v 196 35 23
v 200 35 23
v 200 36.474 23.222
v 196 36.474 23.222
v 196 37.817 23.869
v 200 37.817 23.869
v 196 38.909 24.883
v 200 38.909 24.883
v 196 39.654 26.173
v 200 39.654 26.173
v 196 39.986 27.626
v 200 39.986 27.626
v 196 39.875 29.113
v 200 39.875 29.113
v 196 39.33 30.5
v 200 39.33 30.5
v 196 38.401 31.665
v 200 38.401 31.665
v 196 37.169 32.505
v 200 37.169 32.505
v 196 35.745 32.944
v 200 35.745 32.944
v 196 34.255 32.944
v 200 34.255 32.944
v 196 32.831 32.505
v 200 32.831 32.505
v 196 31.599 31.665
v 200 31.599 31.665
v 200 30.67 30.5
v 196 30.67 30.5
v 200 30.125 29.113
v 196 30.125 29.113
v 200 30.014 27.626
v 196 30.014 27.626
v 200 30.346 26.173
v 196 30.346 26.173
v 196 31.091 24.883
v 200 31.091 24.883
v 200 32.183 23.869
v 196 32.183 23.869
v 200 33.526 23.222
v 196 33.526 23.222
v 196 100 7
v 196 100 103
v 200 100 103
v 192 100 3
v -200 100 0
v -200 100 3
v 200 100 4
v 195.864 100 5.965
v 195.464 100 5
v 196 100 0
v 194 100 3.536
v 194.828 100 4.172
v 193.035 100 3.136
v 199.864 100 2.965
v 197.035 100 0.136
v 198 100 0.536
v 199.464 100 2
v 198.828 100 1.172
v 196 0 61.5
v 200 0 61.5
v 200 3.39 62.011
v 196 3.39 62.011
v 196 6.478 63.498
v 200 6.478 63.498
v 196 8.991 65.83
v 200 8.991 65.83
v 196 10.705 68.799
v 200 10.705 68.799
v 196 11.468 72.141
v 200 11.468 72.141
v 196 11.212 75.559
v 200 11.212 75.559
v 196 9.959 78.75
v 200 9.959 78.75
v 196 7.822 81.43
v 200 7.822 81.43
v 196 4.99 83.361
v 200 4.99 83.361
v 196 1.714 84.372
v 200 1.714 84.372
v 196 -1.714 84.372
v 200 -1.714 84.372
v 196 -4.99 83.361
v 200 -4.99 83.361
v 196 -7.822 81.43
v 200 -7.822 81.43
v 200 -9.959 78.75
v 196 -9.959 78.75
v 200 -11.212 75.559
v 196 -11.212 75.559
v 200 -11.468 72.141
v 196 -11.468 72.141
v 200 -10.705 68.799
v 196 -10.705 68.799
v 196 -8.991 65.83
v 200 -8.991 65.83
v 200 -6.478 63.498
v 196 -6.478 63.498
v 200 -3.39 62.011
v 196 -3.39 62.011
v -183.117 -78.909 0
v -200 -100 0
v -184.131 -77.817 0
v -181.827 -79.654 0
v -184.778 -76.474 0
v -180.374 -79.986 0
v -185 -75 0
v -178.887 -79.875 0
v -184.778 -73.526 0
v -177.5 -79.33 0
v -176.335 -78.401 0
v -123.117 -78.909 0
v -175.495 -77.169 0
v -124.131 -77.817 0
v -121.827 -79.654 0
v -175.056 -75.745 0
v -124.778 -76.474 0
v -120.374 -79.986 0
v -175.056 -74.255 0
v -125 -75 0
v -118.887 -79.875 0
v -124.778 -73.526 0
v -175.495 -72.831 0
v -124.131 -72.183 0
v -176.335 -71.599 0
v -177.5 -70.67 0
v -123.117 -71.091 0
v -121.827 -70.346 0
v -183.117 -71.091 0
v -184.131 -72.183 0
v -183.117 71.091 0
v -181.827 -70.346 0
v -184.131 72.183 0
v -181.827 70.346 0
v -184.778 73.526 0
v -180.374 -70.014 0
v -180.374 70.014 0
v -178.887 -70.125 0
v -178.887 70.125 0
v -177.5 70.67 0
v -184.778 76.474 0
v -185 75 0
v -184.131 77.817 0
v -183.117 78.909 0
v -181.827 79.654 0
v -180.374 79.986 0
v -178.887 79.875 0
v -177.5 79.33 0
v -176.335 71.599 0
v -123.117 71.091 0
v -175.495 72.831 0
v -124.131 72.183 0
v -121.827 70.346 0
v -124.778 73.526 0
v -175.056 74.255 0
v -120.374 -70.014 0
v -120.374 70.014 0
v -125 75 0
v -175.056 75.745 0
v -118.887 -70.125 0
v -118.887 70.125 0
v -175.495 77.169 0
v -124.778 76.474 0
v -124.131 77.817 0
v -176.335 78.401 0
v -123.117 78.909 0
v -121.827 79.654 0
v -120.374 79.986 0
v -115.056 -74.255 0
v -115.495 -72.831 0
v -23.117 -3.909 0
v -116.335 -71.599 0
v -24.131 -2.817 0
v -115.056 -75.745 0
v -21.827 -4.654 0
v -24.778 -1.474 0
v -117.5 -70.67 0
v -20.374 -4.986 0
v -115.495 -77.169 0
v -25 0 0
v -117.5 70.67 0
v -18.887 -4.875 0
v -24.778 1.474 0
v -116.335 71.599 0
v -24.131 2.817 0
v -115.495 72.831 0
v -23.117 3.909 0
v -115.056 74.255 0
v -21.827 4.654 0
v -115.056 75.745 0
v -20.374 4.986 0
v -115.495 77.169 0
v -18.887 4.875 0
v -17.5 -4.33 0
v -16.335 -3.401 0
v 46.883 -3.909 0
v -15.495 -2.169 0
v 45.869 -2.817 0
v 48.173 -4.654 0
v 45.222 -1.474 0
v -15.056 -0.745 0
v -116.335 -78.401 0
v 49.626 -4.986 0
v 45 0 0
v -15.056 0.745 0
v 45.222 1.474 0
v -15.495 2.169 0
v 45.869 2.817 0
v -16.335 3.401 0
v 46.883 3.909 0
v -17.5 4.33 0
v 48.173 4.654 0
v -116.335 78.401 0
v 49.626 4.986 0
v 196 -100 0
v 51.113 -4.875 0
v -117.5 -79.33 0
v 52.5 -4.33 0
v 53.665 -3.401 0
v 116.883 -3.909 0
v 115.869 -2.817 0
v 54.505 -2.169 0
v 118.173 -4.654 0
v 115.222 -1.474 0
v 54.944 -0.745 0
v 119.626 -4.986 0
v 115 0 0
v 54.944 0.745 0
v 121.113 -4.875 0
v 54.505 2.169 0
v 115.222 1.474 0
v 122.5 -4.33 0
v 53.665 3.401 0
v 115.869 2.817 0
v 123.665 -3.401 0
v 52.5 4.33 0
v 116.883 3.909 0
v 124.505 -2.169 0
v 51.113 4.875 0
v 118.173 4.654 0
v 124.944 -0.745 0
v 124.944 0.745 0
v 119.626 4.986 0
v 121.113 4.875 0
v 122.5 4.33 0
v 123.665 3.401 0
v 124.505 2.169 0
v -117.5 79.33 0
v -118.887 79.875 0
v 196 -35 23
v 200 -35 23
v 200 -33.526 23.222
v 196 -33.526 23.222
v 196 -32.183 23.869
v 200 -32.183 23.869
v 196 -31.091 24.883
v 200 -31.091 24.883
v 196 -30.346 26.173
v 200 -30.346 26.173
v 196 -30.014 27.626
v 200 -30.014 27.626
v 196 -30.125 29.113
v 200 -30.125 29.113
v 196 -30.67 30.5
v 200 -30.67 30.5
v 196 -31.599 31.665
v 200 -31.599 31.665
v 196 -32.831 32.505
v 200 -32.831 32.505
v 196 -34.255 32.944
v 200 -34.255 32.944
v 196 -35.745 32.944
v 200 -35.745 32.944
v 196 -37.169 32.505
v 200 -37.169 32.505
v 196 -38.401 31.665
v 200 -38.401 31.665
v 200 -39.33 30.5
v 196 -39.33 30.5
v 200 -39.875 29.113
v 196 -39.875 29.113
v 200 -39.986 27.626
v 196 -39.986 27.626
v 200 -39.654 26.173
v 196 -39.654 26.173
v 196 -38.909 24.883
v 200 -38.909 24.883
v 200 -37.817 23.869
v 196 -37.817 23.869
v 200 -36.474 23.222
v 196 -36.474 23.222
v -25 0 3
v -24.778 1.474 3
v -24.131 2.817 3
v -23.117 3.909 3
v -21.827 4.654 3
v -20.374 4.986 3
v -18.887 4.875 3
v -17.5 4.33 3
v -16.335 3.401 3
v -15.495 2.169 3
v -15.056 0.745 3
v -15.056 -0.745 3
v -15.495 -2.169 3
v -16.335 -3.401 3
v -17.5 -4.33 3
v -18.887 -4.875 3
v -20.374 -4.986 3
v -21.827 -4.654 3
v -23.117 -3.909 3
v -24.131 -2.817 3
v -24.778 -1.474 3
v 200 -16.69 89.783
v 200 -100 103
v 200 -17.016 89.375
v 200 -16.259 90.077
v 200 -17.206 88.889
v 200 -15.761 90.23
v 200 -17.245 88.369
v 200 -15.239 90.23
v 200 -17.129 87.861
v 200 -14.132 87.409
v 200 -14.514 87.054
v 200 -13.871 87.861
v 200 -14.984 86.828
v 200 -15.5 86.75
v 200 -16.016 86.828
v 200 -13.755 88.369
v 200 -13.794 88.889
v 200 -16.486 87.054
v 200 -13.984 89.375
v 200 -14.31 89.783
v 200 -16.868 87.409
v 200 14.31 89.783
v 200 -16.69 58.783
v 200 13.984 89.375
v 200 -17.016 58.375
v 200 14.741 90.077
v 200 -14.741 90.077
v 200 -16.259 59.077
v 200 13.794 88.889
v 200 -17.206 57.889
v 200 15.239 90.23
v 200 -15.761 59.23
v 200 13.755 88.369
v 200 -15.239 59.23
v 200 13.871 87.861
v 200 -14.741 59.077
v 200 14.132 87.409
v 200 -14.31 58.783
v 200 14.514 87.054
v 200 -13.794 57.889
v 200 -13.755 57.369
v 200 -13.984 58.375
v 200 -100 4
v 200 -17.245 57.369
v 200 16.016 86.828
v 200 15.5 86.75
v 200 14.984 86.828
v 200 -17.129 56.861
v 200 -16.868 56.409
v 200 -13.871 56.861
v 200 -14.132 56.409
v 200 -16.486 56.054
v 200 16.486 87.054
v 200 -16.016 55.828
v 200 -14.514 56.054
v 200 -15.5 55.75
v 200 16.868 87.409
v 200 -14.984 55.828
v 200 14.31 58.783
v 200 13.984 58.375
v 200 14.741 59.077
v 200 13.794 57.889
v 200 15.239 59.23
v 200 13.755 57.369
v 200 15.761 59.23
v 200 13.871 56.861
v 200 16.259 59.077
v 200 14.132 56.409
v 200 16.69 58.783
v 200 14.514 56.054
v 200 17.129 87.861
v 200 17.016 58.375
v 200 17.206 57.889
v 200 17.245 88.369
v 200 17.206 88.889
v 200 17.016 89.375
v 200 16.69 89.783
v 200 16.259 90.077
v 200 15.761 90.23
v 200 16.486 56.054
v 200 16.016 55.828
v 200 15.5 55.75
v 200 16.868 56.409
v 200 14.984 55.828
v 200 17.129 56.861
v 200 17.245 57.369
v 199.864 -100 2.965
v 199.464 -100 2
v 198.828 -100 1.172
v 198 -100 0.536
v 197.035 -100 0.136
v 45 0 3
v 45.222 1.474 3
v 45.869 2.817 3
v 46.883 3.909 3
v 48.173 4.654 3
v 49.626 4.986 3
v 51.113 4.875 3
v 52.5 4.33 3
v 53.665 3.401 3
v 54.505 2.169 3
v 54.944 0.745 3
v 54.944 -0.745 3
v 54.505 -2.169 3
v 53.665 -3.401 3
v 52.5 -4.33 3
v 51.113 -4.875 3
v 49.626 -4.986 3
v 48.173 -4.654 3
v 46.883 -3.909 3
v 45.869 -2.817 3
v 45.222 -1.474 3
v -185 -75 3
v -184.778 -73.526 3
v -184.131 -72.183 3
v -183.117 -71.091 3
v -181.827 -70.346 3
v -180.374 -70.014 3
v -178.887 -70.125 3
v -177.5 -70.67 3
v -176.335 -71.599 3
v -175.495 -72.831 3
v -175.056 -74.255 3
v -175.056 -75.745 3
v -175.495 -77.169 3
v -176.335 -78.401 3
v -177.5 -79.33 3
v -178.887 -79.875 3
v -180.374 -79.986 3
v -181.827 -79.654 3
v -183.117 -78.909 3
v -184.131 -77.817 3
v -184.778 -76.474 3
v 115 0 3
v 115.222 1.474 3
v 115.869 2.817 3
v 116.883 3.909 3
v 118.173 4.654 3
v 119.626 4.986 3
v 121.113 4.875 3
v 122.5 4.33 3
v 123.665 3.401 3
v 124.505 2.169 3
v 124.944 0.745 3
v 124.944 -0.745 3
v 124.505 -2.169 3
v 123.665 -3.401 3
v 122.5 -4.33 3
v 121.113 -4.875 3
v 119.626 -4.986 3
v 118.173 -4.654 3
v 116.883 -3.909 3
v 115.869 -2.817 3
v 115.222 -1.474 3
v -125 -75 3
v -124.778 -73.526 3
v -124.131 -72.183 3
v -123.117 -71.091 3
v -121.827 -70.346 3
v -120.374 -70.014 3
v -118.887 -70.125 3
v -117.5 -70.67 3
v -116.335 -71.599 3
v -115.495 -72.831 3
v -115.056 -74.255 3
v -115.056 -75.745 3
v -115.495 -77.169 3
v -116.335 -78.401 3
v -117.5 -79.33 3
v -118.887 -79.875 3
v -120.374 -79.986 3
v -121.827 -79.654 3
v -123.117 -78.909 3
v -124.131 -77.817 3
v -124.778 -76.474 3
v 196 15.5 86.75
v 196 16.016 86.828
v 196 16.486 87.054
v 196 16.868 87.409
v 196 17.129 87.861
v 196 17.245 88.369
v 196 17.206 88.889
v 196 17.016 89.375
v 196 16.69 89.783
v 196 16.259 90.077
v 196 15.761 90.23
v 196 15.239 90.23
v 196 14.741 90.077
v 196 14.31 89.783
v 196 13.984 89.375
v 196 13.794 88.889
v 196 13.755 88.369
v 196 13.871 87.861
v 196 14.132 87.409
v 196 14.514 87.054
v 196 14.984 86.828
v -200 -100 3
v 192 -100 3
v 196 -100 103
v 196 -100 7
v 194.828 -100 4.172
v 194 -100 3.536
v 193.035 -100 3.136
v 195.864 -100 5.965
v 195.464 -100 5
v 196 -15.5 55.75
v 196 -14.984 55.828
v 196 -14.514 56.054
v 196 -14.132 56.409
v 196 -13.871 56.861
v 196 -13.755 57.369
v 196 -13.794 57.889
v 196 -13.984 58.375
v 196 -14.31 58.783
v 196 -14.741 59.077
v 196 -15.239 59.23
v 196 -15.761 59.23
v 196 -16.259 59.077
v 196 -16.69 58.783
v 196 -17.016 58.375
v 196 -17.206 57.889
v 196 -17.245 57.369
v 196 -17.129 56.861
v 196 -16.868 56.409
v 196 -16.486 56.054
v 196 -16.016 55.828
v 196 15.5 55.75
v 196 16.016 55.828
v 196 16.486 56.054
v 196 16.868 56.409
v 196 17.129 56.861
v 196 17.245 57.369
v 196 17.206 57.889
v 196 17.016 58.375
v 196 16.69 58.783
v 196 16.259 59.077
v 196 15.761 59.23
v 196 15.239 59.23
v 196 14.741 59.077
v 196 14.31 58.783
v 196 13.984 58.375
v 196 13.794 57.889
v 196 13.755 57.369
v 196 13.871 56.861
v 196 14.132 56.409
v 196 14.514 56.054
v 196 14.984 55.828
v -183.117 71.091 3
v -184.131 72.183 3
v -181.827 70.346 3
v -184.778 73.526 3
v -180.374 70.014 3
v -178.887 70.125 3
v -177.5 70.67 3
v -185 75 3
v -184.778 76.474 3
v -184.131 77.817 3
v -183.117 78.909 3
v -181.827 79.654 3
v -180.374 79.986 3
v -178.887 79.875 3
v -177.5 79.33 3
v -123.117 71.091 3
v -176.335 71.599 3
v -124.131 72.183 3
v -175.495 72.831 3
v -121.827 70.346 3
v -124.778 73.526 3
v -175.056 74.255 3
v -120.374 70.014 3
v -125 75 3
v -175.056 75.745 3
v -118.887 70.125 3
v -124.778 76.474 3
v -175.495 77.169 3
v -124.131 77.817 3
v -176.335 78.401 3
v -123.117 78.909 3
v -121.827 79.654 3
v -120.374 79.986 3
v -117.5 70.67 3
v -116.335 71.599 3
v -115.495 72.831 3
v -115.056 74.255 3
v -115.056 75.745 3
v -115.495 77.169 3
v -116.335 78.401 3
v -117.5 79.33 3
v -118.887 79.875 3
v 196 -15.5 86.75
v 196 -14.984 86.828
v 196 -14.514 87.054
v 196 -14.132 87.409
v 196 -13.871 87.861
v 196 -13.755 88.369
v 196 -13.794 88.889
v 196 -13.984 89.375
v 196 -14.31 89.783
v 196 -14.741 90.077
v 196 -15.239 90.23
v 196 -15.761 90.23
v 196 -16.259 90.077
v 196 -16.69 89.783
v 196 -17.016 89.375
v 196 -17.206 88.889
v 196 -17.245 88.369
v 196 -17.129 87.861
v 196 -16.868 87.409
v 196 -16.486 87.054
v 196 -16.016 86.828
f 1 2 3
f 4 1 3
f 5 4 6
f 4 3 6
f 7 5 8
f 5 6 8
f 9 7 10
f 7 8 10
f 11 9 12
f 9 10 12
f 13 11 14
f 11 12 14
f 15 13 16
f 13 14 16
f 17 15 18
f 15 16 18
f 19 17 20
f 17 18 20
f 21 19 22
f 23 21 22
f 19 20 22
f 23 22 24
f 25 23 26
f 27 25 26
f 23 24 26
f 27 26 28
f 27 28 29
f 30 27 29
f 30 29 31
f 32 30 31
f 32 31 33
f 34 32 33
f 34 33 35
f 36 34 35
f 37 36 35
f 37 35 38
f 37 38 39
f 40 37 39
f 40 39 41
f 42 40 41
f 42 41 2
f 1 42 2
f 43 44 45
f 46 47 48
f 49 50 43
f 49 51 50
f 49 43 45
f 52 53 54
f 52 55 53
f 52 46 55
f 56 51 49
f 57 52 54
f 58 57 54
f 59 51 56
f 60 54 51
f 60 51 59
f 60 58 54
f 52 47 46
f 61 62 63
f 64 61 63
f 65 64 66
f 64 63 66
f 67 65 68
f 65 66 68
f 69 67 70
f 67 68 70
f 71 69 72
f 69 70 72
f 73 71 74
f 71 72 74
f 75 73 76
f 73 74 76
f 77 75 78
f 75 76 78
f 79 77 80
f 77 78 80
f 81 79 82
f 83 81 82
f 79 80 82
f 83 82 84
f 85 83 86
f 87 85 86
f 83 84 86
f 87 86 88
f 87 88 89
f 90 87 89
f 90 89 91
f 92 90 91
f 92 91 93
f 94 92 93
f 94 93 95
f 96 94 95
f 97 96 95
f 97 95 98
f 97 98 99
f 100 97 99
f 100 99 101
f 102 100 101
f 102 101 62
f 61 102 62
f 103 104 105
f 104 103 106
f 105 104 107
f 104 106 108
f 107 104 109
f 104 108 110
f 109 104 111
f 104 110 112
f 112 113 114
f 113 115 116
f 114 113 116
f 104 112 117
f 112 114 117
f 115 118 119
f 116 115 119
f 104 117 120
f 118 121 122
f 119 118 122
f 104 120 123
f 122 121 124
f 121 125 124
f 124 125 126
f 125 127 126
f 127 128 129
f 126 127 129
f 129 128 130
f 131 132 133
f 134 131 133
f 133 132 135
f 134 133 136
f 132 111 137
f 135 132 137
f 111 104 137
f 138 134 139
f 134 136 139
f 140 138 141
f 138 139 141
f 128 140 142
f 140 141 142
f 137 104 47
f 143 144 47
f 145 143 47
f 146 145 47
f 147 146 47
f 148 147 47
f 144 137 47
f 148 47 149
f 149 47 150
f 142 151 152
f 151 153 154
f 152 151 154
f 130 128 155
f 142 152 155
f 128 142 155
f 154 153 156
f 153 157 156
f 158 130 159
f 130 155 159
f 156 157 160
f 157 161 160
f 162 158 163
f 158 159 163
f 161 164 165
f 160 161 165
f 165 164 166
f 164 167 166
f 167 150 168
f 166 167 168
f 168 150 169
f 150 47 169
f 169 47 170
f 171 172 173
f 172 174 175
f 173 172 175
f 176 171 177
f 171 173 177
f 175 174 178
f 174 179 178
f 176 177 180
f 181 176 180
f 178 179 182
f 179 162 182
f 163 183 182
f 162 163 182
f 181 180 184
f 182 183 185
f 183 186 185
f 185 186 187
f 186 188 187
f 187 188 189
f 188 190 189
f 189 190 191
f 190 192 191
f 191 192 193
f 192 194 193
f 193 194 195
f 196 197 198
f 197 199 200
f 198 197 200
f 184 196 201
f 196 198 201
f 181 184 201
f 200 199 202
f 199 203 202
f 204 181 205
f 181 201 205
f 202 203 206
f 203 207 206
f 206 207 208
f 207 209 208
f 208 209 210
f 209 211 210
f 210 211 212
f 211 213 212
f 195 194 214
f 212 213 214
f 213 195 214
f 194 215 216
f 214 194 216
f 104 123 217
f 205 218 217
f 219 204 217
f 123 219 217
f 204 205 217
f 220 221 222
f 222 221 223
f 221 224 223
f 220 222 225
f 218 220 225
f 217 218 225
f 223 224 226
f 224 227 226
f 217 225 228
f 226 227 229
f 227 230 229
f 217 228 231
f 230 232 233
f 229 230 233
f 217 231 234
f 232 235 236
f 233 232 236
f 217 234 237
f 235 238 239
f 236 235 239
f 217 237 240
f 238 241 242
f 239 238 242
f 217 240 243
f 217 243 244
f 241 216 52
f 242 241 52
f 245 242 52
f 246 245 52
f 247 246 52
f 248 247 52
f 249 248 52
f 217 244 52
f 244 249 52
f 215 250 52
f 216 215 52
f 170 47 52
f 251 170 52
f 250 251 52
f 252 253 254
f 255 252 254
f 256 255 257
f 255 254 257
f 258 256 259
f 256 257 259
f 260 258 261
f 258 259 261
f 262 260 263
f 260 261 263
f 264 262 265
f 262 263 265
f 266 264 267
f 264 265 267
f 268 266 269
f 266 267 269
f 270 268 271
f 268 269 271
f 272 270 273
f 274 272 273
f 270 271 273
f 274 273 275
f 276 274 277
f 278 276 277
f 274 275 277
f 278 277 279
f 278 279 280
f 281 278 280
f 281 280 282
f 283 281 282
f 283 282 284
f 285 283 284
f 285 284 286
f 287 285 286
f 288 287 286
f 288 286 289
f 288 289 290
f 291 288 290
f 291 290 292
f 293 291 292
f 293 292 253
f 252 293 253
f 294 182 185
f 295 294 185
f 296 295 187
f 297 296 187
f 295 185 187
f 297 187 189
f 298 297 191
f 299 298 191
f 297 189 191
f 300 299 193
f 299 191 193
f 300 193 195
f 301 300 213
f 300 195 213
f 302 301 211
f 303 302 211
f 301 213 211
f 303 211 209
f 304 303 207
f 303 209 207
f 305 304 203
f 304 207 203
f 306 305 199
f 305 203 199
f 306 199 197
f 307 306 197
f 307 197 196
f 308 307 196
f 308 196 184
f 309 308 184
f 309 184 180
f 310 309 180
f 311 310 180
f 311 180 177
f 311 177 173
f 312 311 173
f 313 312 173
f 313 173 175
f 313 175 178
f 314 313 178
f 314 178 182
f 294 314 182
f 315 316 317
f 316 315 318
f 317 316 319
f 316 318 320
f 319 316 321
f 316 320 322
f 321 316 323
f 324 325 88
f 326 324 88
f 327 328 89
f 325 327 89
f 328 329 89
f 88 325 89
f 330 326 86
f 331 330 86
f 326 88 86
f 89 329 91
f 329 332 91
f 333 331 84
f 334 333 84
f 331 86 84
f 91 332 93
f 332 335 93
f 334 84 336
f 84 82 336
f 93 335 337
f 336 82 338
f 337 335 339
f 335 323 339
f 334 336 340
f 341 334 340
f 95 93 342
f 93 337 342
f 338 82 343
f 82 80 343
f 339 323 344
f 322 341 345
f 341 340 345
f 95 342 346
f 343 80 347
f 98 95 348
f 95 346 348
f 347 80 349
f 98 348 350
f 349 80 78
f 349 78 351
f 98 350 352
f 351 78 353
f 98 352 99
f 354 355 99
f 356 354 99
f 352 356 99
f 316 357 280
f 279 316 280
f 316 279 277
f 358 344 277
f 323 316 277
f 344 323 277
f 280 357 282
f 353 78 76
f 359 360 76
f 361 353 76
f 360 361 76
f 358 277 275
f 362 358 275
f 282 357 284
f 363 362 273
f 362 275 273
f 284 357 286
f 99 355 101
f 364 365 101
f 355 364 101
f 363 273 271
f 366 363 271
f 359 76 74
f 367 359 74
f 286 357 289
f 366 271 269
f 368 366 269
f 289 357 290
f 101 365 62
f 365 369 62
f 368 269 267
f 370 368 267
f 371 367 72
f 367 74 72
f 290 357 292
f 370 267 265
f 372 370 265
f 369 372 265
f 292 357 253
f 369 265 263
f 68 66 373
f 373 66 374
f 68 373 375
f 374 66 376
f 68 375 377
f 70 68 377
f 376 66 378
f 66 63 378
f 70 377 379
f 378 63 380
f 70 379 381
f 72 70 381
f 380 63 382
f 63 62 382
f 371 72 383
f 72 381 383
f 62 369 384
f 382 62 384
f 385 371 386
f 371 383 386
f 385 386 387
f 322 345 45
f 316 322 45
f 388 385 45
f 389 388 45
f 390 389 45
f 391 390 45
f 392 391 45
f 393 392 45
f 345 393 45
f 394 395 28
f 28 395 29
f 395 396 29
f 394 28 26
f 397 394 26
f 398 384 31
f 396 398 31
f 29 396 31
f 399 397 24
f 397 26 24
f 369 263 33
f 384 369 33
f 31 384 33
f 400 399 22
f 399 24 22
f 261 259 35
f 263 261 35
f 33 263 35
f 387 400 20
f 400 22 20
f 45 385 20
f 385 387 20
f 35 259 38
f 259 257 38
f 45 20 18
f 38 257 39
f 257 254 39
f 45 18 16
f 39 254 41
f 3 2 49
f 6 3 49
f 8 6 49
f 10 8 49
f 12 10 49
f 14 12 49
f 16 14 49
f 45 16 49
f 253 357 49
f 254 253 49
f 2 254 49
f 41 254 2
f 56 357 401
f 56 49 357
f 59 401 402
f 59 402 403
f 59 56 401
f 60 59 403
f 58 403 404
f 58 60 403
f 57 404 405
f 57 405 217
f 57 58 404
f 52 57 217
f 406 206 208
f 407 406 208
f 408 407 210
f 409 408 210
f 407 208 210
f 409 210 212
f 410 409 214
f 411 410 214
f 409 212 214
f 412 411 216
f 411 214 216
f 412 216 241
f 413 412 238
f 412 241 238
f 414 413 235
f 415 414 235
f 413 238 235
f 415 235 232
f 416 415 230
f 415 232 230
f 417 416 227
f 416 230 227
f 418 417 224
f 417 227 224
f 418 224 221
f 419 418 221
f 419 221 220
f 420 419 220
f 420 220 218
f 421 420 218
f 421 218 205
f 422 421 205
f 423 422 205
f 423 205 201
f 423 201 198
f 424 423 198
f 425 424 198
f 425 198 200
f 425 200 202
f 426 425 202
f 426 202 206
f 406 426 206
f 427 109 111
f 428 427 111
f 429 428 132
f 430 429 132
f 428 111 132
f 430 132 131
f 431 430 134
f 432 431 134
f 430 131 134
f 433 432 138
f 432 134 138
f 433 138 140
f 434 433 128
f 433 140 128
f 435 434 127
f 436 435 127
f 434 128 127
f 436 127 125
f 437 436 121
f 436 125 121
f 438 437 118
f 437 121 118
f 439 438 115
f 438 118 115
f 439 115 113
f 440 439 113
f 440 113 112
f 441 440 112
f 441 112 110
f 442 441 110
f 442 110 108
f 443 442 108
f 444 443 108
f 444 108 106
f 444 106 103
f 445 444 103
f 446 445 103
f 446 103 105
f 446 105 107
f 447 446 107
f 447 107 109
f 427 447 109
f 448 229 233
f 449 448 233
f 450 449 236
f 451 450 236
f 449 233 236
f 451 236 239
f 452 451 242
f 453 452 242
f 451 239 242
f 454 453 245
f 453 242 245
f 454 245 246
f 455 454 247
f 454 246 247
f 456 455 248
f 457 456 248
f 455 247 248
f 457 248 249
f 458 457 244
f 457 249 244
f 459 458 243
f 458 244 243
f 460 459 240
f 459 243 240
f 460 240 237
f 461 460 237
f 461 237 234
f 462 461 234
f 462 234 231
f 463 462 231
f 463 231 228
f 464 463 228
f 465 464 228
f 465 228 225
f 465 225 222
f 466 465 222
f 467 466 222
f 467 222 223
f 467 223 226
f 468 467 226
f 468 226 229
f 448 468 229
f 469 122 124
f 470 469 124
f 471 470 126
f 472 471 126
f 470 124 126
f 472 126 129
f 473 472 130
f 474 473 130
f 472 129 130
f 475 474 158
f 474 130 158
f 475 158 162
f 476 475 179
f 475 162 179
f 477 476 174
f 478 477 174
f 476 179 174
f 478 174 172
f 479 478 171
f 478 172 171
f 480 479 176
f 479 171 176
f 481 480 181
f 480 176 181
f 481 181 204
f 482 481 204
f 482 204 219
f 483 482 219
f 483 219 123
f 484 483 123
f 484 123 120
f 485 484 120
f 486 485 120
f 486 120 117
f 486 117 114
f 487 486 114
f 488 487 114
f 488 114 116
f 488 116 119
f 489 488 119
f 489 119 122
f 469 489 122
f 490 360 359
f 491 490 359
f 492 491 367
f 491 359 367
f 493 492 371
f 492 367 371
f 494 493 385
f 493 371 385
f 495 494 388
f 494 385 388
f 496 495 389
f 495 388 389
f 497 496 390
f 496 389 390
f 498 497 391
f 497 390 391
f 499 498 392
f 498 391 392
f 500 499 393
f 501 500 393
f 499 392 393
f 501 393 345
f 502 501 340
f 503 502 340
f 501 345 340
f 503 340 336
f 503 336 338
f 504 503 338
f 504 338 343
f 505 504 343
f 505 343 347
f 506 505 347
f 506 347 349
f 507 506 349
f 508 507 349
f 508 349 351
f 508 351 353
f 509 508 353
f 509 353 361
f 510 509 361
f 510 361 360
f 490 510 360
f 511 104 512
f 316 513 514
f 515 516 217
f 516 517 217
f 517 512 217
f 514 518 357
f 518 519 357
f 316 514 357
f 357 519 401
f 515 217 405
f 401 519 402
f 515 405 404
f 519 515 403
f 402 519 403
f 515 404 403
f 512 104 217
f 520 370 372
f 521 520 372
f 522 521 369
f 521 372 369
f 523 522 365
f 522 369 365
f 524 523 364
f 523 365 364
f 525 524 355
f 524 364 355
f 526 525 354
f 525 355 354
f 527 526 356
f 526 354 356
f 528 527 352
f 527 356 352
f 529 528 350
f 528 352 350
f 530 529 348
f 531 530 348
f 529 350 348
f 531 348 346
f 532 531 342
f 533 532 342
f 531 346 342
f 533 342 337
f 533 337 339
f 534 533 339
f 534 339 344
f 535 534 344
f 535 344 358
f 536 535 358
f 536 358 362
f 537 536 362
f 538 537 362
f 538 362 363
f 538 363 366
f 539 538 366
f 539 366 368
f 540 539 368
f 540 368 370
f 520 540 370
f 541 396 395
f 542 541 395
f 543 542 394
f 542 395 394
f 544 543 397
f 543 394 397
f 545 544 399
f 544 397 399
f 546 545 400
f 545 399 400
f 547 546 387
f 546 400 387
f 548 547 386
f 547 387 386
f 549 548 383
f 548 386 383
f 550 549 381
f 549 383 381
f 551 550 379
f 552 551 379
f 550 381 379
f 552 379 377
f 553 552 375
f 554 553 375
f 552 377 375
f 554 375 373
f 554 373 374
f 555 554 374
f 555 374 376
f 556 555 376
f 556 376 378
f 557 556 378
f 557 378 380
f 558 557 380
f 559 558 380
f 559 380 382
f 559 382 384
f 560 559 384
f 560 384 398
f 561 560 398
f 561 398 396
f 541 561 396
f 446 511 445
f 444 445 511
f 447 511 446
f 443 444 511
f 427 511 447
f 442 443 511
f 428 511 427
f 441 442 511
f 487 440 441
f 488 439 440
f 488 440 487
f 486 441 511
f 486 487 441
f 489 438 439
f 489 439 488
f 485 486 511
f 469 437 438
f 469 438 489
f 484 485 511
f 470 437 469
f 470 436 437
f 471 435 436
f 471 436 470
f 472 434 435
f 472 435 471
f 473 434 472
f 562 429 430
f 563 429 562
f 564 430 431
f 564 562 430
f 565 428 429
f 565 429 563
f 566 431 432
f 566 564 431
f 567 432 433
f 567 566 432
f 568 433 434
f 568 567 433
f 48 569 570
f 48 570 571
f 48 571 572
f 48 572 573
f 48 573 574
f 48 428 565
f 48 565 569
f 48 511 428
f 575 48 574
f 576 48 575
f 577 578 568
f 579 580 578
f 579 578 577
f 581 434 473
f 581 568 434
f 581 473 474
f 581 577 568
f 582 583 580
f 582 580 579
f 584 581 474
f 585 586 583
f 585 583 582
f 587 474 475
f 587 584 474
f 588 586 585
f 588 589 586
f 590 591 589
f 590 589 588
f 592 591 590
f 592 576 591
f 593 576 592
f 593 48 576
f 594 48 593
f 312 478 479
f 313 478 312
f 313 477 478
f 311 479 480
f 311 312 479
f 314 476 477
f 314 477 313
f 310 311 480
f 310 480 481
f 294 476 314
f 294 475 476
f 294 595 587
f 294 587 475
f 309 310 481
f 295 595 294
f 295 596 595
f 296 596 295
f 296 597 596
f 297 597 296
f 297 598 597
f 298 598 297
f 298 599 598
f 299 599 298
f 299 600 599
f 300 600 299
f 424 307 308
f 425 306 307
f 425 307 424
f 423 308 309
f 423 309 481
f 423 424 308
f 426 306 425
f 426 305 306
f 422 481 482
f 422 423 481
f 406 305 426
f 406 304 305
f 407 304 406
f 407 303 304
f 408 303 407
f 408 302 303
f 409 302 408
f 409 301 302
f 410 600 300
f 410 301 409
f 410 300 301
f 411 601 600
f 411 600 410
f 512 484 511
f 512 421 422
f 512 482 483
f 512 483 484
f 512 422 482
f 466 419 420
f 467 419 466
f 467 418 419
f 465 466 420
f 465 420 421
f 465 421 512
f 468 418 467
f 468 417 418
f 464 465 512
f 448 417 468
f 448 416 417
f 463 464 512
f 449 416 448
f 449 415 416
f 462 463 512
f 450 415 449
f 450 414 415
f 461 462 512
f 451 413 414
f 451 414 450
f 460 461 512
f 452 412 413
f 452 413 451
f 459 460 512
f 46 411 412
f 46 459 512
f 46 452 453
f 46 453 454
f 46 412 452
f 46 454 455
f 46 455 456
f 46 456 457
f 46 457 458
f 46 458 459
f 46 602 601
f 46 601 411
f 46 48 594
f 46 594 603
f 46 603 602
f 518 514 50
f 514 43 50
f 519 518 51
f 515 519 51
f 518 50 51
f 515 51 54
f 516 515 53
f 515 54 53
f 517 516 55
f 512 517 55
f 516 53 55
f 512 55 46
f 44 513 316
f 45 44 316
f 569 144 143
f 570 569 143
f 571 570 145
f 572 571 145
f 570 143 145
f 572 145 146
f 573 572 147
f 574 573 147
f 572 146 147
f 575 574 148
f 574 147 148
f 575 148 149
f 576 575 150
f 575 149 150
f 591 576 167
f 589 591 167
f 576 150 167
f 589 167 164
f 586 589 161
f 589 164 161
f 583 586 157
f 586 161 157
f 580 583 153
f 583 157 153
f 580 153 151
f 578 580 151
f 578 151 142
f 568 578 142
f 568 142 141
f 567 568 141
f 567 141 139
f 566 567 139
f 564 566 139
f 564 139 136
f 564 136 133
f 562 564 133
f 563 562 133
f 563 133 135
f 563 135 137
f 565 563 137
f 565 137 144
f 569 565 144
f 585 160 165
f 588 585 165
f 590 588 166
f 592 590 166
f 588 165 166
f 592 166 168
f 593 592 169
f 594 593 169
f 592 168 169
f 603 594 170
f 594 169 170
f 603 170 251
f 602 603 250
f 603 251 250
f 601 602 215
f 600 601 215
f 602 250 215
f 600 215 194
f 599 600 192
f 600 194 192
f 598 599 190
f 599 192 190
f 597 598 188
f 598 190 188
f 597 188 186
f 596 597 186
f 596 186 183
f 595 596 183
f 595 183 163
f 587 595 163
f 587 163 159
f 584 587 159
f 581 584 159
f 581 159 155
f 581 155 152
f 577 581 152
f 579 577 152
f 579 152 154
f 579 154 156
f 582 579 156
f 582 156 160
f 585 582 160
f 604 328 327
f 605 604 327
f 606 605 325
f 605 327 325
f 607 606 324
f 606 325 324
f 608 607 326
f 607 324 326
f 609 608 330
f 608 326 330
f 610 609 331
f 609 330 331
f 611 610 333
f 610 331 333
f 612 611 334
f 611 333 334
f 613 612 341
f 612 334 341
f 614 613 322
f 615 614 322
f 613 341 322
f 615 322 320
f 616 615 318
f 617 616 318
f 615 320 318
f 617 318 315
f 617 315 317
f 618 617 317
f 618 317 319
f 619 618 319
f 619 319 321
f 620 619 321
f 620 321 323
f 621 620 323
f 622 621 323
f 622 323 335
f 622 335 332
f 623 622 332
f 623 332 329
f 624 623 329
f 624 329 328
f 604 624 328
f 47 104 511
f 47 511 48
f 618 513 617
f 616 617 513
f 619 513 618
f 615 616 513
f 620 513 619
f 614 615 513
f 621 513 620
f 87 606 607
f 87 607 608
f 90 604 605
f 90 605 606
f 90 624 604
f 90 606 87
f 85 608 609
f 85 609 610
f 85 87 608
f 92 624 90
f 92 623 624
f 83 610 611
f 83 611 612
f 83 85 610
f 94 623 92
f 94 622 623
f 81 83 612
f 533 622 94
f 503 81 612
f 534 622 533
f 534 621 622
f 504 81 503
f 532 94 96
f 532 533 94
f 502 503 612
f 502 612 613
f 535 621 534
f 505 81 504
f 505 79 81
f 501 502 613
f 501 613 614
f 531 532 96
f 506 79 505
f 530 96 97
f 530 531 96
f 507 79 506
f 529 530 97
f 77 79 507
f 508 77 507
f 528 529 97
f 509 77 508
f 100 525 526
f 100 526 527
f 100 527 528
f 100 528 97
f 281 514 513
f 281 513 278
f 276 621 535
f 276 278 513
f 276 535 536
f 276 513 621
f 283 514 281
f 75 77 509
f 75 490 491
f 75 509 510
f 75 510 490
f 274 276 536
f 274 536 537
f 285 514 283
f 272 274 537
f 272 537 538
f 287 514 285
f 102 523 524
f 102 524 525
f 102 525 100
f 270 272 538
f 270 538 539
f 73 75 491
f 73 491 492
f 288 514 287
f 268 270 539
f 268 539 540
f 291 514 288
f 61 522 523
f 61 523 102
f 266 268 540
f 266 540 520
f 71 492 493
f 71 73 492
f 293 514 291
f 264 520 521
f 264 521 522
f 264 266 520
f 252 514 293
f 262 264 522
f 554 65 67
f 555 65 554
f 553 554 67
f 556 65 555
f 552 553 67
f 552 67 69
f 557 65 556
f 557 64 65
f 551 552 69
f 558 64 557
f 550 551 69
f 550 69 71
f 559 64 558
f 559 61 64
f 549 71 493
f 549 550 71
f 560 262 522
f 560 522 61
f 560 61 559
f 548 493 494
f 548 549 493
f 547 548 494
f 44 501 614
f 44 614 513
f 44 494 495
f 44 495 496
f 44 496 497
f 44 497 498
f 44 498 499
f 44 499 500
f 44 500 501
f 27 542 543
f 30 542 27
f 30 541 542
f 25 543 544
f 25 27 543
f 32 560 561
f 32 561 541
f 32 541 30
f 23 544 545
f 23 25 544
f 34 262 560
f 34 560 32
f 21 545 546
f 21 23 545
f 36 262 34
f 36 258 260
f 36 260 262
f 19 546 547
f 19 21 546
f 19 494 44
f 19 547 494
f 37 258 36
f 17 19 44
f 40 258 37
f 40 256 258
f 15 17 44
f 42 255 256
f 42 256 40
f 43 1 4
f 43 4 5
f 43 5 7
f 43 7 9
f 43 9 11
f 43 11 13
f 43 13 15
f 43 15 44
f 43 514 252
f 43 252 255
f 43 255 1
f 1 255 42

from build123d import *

# Parameters (mm, degrees)
SKETCH1_W           = 400
SKETCH1_H           = 200
BOSS_EXTRUDE1_DEPTH = 3
SKETCH2_R           = 5
CUT_EXTRUDE1_DEPTH  = 10
SKETCH3_W           = 4
SKETCH3_H           = 200
BOSS_EXTRUDE2_DEPTH = 90
FILLET2_R           = 4
SKETCH4_R           = 11.5
CUT_EXTRUDE2_DEPTH  = 90
SKETCH5_R           = 1.75
CUT_EXTRUDE3_DEPTH  = 90
SKETCH6_R           = 5
CUT_EXTRUDE4_DEPTH  = 15
SKETCH7_W           = 4
SKETCH7_H           = 200
BOSS_EXTRUDE3_DEPTH = 10


with BuildPart() as part:
    # Sketch1 → Boss-Extrude1 (new body)
    with BuildSketch(Plane.XY):
        Rectangle(SKETCH1_W, SKETCH1_H)
    extrude(amount=BOSS_EXTRUDE1_DEPTH)

    # Sketch2 → Cut-Extrude1 (cut)
    with BuildSketch(Plane(origin=(0, 0, 0), x_dir=(-1, 0, 0), z_dir=(0, 0, -1))):
        with Locations((-120, 0)):
            Circle(SKETCH2_R)
        with Locations((-50, 0)):
            Circle(SKETCH2_R)
        with Locations((20, 0)):
            Circle(SKETCH2_R)
        with Locations((180, -75)):
            Circle(SKETCH2_R)
        with Locations((120, -75)):
            Circle(SKETCH2_R)
        with Locations((120, 75)):
            Circle(SKETCH2_R)
        with Locations((180, 75)):
            Circle(SKETCH2_R)
    extrude(amount=-CUT_EXTRUDE1_DEPTH, mode=Mode.SUBTRACT)

    # Sketch3 → Boss-Extrude2 (add)
    with BuildSketch(Plane.XY.offset(3)):
        with Locations((198, 0)):
            Rectangle(SKETCH3_W, SKETCH3_H)
    extrude(amount=BOSS_EXTRUDE2_DEPTH)

    # Fillet2
    fillet2_edges = [part.edges().sort_by_distance(p)[0] for p in [
        (196, 0, 3),
        (200, 0, 0),
    ]]
    fillet(fillet2_edges, radius=FILLET2_R)

    # Sketch4 → Cut-Extrude2 (cut)
    with BuildSketch(Plane(origin=(200, 0, 0), x_dir=(0, 0, -1), z_dir=(1, 0, 0))):
        with Locations((-73, 0)):
            Circle(SKETCH4_R)
    extrude(amount=-CUT_EXTRUDE2_DEPTH, mode=Mode.SUBTRACT)

    # Sketch5 → Cut-Extrude3 (cut)
    with BuildSketch(Plane(origin=(200, 0, 0), x_dir=(0, 0, -1), z_dir=(1, 0, 0))):
        with Locations((-57.5, 15.5)):
            Circle(SKETCH5_R)
        with Locations((-57.5, -15.5)):
            Circle(SKETCH5_R)
        with Locations((-88.5, -15.5)):
            Circle(SKETCH5_R)
        with Locations((-88.5, 15.5)):
            Circle(SKETCH5_R)
    extrude(amount=-CUT_EXTRUDE3_DEPTH, mode=Mode.SUBTRACT)

    # Sketch6 → Cut-Extrude4 (cut)
    with BuildSketch(Plane(origin=(200, 0, 0), x_dir=(0, 0, -1), z_dir=(1, 0, 0))):
        with Locations((-28, -35)):
            Circle(SKETCH6_R)
        with Locations((-28, 35)):
            Circle(SKETCH6_R)
    extrude(amount=-CUT_EXTRUDE4_DEPTH, mode=Mode.SUBTRACT)

    # Sketch7 → Boss-Extrude3 (add)
    with BuildSketch(Plane.XY.offset(93)):
        with Locations((198, 0)):
            Rectangle(SKETCH7_W, SKETCH7_H)
    extrude(amount=BOSS_EXTRUDE3_DEPTH)


solid = part.part
